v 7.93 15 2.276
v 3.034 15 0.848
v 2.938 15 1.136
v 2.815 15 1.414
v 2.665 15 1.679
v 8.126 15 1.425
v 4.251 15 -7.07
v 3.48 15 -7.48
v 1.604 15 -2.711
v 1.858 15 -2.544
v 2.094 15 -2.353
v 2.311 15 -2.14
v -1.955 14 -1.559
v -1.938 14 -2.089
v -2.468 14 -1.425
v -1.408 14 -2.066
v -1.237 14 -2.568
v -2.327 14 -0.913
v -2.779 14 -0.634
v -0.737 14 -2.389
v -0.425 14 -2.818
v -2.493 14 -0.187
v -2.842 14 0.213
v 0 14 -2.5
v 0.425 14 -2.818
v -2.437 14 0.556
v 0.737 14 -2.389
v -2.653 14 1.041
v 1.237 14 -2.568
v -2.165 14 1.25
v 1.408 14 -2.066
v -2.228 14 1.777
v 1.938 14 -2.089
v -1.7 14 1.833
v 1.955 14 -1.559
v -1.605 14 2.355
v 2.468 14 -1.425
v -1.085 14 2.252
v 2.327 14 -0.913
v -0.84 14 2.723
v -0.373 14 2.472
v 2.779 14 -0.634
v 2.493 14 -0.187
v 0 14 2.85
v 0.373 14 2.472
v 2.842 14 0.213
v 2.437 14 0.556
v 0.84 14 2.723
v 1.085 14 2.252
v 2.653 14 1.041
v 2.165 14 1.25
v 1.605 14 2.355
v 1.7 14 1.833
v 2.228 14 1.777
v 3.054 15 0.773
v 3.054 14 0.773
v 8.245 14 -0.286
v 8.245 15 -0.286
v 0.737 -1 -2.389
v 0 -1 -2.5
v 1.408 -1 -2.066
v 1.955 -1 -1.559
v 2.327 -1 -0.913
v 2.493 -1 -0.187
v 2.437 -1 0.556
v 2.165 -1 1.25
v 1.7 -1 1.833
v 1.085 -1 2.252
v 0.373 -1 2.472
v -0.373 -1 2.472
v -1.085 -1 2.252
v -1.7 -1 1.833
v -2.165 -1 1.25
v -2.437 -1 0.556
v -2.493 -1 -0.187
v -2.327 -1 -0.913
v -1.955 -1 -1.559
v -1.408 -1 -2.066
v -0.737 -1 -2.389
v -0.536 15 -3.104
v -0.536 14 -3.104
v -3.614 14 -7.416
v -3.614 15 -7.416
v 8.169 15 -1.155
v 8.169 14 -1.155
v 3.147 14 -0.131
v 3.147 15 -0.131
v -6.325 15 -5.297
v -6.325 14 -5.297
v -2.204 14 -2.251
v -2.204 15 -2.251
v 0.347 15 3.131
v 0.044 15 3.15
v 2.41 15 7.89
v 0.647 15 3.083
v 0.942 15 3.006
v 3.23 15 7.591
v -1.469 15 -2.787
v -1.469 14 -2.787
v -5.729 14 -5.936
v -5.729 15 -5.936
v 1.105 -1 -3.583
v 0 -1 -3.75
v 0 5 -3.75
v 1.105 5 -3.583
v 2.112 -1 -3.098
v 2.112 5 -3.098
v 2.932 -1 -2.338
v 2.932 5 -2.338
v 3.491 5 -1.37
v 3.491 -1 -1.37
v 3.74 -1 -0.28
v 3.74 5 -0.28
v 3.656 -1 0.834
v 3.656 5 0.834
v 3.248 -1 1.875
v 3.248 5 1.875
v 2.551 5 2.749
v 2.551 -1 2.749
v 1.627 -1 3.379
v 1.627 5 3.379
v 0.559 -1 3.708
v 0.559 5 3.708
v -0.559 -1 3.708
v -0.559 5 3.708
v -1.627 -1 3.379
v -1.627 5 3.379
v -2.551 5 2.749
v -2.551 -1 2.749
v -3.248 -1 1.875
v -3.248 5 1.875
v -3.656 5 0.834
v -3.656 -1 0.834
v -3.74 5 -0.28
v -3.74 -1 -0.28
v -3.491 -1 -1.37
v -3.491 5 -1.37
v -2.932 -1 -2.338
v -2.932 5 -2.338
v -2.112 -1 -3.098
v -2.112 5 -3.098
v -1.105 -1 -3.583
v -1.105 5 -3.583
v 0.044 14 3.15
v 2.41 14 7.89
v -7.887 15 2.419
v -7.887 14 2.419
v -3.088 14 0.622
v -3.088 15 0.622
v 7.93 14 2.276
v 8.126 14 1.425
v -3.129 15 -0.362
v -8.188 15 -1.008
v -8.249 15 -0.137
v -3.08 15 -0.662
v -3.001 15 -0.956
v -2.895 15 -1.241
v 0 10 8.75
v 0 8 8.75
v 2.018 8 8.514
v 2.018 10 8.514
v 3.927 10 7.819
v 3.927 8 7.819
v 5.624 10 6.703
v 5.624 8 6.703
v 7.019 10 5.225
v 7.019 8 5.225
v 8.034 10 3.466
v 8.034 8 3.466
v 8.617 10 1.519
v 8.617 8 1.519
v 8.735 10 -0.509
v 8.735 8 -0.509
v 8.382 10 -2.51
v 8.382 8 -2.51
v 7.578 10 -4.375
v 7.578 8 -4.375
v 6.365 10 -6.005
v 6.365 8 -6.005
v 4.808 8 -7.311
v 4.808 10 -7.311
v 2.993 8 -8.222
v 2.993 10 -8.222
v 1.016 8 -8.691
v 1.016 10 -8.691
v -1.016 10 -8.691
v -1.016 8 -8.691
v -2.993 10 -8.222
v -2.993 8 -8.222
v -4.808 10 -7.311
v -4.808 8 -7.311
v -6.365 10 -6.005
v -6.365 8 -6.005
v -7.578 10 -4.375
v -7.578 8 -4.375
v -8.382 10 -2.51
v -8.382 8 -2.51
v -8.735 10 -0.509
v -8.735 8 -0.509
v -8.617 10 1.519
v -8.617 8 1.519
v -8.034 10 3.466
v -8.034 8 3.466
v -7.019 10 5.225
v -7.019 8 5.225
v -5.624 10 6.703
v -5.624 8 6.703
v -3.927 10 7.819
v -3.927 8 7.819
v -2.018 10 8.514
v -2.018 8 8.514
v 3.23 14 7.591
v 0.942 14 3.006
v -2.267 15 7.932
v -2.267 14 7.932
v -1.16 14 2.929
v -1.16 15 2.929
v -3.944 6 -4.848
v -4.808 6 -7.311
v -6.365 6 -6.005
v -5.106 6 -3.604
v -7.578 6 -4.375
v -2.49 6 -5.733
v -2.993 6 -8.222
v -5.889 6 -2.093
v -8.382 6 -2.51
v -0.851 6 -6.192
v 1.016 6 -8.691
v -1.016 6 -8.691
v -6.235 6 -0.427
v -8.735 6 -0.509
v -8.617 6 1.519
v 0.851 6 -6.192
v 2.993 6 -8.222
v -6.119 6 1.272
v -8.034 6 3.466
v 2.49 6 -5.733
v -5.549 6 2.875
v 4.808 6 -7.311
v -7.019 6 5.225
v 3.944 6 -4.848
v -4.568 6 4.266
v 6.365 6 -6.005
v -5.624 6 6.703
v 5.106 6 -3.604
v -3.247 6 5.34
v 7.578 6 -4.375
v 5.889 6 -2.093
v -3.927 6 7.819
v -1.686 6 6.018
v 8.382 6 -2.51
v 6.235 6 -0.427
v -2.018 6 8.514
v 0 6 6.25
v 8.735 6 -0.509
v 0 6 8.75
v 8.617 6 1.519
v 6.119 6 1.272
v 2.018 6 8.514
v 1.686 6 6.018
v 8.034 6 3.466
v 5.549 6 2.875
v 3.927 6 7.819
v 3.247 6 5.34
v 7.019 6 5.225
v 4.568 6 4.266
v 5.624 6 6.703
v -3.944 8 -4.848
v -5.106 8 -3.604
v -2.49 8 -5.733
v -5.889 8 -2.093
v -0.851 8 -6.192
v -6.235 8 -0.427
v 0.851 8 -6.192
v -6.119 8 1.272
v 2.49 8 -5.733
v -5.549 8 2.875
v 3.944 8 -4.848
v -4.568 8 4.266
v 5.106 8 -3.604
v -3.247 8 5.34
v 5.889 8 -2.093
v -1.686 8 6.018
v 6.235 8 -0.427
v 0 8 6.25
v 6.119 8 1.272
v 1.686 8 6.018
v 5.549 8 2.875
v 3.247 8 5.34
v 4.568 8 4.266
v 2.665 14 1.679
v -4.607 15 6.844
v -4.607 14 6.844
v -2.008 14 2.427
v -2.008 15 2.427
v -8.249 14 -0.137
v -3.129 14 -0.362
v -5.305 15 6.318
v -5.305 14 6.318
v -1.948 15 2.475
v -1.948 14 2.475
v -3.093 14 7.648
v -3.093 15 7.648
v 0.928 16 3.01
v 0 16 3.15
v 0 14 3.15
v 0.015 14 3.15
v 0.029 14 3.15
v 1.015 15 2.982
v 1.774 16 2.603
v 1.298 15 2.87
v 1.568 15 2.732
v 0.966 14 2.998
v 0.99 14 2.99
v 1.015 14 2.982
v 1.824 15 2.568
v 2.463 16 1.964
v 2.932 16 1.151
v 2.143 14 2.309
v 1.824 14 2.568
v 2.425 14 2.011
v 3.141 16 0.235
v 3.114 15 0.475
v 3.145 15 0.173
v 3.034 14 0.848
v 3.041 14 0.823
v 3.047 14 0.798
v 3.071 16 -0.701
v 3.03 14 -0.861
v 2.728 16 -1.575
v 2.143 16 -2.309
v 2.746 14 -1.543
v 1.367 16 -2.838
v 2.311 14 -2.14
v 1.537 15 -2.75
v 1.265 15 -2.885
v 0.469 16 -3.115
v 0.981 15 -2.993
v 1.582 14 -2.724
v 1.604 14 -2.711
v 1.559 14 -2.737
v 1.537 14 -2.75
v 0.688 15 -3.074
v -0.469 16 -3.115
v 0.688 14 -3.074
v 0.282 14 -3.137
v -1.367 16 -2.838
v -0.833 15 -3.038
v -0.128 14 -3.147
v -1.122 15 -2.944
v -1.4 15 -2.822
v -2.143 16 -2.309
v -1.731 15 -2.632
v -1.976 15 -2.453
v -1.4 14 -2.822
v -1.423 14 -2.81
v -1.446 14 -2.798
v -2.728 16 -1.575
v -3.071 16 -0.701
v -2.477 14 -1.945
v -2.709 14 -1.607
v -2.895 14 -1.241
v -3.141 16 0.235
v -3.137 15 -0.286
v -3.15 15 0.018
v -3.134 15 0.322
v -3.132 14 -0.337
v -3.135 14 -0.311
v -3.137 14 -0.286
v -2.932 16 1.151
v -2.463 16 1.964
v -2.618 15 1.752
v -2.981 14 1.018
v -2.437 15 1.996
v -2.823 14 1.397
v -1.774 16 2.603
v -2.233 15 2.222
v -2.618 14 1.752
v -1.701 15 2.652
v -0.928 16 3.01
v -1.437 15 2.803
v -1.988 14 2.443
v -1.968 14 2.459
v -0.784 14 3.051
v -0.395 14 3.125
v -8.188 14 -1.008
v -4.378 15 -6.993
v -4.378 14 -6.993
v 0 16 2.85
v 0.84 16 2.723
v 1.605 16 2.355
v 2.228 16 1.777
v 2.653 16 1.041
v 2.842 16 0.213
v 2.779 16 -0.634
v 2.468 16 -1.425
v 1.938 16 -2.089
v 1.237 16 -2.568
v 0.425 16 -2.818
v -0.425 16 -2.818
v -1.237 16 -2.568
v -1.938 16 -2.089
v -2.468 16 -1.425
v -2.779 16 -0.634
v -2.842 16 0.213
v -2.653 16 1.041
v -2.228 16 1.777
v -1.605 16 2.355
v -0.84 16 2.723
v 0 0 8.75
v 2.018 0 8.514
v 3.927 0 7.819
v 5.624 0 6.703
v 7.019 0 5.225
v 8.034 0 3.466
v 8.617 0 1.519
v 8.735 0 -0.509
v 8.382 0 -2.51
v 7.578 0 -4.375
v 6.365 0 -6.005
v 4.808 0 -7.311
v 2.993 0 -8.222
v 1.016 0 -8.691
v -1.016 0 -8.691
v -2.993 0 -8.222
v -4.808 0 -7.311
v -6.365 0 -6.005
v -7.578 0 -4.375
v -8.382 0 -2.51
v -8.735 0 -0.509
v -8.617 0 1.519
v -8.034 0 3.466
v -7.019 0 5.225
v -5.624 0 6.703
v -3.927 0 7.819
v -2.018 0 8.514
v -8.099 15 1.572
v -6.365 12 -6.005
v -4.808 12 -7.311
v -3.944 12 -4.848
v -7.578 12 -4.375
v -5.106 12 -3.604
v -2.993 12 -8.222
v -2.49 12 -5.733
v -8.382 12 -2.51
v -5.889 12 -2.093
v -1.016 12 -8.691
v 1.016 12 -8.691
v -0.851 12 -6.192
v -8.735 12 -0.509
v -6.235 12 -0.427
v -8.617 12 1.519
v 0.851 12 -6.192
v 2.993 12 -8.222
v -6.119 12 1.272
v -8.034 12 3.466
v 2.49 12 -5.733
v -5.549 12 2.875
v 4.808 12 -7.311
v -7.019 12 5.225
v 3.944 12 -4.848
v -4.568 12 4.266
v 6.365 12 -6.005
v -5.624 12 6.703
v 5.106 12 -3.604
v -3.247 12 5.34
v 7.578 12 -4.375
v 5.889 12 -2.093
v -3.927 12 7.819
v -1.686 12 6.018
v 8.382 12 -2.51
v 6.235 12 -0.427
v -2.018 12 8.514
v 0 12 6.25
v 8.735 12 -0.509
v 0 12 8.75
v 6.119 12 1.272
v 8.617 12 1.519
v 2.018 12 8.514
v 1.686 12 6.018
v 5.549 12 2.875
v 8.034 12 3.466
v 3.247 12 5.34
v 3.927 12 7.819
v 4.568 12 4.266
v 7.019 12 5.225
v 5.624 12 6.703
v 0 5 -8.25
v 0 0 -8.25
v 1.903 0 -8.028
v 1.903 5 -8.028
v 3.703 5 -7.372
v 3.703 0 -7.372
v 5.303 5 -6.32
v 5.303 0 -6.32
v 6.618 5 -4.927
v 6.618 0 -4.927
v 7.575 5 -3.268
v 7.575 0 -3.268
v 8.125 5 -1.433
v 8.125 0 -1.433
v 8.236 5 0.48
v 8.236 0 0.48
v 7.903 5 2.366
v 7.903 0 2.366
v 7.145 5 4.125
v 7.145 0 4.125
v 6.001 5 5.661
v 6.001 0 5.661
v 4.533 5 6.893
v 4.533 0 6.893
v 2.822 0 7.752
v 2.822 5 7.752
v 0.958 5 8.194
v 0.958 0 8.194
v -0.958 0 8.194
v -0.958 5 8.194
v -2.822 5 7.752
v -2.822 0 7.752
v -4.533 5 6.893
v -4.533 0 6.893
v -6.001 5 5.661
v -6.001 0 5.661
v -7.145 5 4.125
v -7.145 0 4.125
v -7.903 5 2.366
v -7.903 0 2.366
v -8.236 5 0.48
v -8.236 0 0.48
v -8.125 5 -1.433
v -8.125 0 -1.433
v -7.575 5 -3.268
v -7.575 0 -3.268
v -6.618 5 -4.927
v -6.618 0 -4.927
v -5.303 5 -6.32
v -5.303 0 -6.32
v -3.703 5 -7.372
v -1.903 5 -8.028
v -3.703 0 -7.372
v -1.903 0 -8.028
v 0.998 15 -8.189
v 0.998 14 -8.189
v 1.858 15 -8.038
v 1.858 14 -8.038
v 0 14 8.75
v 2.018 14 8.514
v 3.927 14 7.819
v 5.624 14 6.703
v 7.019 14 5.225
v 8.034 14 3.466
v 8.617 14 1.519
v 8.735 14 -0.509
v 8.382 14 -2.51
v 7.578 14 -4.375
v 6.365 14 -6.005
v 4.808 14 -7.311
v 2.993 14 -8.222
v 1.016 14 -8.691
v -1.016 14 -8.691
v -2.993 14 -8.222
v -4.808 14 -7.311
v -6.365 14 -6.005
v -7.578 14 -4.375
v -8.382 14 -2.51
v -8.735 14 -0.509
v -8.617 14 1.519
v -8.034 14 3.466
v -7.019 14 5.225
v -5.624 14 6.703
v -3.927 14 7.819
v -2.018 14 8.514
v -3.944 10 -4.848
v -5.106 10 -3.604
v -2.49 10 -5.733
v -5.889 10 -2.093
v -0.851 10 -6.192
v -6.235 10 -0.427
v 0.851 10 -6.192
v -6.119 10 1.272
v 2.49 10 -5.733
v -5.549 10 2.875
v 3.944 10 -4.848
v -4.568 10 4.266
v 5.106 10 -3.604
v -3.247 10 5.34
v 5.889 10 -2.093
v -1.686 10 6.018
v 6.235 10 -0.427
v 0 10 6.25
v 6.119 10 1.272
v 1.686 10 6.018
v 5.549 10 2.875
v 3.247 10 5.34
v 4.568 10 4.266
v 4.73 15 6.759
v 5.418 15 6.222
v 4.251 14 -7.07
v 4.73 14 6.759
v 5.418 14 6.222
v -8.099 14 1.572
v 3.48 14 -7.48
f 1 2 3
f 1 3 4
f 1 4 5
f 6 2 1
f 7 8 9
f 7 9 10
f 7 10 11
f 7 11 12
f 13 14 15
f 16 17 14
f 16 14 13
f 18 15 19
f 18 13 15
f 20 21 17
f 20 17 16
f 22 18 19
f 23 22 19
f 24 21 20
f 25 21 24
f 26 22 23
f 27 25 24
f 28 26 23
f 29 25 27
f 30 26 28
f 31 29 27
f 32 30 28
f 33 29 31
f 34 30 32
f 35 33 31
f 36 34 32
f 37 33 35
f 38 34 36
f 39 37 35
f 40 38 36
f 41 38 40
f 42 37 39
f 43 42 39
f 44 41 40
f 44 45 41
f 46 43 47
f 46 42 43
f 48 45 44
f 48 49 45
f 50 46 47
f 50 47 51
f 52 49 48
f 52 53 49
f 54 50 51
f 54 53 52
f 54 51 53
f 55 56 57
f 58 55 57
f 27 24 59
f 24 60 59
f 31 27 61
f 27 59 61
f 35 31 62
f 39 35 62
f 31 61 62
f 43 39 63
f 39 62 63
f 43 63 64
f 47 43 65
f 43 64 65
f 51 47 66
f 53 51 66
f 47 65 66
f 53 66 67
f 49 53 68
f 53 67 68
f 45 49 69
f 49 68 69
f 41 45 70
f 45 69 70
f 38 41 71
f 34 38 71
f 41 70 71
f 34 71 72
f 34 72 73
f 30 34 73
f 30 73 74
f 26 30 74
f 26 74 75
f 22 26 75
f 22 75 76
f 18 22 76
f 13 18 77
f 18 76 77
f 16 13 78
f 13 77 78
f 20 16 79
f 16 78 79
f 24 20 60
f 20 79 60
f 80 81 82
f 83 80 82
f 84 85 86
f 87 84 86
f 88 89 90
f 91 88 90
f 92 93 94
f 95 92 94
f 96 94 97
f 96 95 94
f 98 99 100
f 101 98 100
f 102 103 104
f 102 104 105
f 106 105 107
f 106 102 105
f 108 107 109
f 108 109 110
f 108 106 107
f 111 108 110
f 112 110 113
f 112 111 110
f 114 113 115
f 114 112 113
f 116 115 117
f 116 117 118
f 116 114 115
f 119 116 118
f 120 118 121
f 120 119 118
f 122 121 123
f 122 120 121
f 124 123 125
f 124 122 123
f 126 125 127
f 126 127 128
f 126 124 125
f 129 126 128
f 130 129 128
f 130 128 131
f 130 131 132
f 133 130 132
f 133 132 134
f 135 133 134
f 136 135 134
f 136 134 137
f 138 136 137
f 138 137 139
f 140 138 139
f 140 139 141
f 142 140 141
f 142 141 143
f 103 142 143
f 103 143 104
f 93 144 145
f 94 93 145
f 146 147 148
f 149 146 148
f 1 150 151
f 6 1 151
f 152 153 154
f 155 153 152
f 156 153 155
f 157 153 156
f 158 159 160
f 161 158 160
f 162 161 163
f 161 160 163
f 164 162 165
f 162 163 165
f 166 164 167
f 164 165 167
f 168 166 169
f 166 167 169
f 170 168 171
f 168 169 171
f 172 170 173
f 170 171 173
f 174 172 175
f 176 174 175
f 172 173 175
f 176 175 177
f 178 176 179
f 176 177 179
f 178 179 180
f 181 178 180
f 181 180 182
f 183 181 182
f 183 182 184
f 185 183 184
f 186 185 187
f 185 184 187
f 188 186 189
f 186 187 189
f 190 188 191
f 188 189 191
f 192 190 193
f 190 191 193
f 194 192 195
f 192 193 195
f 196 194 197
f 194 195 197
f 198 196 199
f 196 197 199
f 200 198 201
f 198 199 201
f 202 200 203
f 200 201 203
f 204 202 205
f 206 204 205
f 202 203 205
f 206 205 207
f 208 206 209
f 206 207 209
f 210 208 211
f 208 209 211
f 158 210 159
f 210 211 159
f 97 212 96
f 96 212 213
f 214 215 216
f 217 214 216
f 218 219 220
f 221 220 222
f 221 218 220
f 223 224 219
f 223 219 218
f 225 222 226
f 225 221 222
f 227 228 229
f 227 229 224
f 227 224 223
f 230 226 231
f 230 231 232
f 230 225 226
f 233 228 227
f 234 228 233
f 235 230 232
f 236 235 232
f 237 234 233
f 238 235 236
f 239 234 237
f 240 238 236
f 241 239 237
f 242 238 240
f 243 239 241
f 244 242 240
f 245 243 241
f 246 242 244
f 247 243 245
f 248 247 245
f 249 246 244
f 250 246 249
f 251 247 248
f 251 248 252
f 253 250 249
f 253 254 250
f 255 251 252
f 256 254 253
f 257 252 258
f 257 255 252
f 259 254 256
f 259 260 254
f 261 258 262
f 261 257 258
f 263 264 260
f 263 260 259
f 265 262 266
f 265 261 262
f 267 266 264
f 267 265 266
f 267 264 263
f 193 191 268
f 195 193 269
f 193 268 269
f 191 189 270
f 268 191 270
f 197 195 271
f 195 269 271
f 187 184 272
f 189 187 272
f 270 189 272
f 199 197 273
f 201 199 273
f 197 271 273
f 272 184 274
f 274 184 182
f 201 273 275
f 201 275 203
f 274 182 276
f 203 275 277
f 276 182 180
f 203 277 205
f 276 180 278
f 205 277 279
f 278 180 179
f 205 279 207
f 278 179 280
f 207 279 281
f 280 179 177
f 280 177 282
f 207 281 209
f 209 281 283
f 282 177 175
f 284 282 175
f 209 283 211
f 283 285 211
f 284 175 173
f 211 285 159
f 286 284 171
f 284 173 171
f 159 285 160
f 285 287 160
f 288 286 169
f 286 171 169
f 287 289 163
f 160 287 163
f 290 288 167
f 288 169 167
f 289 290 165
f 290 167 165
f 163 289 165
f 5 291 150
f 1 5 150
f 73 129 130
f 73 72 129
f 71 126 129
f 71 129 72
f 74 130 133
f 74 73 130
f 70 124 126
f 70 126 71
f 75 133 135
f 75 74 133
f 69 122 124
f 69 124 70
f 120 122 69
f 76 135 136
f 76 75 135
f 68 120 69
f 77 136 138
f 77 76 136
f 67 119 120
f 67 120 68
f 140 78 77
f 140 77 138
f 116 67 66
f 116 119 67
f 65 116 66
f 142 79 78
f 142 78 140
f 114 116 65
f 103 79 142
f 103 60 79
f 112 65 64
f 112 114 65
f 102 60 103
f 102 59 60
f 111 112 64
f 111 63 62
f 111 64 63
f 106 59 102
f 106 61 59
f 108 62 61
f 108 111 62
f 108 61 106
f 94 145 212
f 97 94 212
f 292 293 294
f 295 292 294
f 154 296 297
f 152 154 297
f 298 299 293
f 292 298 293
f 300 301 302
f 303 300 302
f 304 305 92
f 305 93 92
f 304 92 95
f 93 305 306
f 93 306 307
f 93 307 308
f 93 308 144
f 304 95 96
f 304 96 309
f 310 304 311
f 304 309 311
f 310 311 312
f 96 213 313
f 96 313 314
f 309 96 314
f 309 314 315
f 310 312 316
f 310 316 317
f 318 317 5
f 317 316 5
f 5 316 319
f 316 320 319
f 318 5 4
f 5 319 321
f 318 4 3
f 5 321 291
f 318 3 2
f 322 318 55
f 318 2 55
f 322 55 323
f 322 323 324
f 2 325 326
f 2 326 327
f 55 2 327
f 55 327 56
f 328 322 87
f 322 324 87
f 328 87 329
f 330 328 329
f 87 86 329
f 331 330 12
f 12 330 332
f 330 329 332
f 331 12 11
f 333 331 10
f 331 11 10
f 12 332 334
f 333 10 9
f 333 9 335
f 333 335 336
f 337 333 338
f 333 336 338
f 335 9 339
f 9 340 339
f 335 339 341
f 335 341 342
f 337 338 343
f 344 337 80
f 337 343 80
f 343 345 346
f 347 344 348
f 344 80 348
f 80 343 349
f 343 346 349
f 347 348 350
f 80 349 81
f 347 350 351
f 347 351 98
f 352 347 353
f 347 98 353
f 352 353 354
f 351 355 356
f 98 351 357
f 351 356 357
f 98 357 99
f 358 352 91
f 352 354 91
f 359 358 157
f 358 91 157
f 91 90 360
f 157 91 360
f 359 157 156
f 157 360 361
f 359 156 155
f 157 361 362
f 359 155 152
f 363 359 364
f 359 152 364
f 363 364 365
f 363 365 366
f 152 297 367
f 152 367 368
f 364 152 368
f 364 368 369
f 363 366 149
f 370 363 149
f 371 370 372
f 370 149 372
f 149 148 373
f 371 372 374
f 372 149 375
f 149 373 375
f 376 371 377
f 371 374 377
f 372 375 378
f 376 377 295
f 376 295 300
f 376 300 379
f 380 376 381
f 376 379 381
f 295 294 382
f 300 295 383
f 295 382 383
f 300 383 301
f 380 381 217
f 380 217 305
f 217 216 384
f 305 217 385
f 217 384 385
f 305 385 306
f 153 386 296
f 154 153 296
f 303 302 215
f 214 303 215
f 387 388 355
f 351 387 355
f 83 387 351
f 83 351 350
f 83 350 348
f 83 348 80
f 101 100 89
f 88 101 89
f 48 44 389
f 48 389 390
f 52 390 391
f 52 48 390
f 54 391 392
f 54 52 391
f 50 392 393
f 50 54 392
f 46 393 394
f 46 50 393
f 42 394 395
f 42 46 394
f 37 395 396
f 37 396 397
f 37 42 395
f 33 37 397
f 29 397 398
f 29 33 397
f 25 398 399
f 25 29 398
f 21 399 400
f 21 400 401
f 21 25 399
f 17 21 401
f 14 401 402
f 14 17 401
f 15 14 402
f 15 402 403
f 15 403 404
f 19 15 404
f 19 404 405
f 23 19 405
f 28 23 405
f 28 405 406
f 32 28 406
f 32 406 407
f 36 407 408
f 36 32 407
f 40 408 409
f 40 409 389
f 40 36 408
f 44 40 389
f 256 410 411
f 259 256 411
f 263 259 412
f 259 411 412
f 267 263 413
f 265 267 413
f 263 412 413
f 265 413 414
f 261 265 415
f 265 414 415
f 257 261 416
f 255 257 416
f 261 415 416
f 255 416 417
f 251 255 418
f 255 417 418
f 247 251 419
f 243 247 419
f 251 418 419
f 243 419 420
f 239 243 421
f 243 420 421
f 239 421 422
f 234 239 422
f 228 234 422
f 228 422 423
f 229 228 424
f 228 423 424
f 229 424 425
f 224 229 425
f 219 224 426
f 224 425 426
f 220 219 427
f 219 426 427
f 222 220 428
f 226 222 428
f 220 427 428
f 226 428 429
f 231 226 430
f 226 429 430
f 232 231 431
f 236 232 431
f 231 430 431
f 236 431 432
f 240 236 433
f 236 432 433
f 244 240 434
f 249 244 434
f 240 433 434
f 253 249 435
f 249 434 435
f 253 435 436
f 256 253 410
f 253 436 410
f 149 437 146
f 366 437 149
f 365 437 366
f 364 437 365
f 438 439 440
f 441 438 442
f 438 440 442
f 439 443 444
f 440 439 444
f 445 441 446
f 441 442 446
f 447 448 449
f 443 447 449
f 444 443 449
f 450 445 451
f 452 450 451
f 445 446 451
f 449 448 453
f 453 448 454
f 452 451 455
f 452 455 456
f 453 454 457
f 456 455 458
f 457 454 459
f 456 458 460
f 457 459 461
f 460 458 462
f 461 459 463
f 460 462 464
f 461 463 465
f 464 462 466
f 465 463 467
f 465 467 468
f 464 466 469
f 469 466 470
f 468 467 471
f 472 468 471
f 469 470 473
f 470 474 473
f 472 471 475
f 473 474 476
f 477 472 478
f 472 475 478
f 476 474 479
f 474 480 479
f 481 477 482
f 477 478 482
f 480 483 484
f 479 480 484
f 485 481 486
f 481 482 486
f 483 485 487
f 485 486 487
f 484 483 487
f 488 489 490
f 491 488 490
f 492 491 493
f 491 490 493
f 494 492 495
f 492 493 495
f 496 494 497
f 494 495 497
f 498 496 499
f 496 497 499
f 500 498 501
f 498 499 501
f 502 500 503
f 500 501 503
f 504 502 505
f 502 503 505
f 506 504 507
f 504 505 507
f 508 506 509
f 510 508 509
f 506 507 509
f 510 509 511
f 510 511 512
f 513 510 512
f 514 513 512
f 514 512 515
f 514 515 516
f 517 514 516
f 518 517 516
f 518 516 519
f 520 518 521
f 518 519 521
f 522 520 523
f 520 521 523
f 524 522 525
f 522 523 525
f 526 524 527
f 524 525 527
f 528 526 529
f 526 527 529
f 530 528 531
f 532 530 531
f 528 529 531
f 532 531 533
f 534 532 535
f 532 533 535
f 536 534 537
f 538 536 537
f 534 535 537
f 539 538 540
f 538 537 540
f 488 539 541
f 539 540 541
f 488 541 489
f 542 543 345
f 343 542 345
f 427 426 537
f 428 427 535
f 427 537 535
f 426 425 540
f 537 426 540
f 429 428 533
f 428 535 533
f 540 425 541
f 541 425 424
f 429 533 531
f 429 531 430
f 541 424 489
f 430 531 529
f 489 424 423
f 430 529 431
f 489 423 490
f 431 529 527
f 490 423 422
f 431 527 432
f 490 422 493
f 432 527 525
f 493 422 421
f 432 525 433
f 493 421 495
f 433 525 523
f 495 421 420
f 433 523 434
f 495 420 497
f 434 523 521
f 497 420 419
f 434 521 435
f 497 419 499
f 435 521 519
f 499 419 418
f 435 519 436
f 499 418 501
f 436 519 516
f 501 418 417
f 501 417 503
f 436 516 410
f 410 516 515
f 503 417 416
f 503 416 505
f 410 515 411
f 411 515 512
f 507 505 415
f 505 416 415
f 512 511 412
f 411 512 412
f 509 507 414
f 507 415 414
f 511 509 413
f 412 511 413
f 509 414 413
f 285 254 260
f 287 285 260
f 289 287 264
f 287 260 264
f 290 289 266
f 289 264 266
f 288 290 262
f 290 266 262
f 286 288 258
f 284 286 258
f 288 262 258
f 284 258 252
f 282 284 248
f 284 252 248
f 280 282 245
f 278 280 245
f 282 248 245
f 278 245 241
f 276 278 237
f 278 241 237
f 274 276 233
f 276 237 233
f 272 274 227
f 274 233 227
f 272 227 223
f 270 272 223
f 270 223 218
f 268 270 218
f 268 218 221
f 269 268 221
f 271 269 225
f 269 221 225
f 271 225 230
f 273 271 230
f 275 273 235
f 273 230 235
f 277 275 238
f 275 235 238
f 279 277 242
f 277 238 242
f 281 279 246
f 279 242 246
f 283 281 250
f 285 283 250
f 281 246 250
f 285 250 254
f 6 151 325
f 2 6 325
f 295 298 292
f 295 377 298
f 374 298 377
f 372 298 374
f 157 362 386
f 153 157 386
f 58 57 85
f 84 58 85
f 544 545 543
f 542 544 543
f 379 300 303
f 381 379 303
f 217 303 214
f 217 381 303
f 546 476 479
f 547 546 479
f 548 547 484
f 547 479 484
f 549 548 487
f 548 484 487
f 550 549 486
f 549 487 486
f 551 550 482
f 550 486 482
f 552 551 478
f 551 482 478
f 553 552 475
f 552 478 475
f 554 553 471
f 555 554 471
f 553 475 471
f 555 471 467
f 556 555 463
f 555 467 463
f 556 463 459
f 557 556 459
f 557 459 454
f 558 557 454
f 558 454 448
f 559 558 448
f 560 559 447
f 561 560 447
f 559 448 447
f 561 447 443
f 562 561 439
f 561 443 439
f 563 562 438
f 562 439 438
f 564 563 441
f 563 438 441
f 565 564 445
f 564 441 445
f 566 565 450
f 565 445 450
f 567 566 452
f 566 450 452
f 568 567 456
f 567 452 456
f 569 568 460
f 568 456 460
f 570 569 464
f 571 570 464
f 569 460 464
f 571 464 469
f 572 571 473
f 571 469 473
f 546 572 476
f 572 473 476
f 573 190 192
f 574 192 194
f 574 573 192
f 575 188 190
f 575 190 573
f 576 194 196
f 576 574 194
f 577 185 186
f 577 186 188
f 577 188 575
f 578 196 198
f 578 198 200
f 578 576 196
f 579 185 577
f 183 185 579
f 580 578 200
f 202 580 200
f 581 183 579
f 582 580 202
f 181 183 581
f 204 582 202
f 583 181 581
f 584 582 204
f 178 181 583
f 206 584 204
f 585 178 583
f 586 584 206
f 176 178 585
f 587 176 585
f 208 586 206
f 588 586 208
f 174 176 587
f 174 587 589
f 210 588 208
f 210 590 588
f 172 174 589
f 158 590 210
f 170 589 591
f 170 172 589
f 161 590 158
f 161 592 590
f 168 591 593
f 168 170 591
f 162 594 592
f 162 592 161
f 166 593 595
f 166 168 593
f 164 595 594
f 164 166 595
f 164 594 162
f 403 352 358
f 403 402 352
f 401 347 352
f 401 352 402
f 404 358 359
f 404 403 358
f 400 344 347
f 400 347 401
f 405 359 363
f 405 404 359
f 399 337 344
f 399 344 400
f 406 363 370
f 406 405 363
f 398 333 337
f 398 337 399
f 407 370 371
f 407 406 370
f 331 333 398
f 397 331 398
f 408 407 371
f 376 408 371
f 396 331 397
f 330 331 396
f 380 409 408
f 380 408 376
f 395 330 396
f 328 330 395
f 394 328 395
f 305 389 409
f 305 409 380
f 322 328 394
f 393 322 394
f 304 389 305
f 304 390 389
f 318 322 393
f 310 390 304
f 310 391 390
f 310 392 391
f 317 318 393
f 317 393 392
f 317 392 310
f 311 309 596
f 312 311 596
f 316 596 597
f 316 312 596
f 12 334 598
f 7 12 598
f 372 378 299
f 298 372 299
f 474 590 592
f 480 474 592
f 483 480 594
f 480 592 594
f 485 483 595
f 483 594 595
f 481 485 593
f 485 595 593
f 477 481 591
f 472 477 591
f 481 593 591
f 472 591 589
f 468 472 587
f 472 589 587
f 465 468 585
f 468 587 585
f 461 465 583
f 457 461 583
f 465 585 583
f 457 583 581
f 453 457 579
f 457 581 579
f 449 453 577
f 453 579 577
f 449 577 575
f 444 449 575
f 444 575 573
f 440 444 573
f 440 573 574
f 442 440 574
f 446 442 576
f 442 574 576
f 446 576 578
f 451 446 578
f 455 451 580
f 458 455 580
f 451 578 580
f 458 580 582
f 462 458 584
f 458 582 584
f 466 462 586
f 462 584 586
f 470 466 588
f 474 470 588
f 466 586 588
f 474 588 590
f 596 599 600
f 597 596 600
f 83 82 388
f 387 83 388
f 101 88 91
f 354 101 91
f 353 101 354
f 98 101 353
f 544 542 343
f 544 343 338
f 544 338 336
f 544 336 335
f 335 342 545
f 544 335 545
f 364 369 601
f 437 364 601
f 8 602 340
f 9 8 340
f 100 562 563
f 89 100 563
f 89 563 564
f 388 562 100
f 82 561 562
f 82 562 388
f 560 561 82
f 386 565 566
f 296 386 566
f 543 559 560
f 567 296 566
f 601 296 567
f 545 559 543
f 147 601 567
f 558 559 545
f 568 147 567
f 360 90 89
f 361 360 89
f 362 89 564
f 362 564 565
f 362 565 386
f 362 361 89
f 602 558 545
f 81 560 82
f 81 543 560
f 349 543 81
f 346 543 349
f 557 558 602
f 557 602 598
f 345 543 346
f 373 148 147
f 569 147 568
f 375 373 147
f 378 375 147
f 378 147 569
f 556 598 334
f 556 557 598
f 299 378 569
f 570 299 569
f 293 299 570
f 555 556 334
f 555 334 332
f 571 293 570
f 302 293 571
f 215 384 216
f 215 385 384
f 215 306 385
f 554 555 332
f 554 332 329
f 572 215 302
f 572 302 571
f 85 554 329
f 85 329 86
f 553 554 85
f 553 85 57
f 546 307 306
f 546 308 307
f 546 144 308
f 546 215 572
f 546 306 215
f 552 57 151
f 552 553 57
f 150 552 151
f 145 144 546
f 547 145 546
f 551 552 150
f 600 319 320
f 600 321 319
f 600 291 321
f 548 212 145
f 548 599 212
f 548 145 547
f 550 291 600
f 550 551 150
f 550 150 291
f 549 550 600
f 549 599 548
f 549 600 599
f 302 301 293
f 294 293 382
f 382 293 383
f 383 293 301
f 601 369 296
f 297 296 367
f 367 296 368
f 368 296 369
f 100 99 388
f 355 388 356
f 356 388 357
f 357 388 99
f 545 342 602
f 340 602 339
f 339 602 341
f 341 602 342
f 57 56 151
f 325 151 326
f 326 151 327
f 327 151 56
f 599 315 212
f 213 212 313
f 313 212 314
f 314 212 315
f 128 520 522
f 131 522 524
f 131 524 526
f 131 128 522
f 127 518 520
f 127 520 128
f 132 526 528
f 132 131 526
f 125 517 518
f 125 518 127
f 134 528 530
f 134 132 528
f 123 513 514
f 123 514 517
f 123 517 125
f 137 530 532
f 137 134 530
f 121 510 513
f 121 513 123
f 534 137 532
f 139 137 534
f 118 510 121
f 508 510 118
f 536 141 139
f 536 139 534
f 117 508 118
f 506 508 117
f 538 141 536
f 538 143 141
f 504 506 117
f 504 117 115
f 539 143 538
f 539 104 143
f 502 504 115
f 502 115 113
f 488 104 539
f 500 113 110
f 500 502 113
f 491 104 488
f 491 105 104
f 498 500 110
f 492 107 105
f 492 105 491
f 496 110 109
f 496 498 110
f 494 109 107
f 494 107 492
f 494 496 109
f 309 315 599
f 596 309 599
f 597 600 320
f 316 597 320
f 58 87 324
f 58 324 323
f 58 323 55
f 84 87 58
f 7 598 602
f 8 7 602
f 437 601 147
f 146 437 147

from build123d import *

# Parameters (mm, degrees)
SKETCH1_R            = 8.75
BOSS_EXTRUDE1_DEPTH  = 6
SKETCH2_R            = 8.25
SKETCH2_R_2          = 3.75
CUT_EXTRUDE1_DEPTH   = 5
SKETCH3_R            = 2.5
CUT_EXTRUDE2_DEPTH   = 20
BOSS_EXTRUDE3_START  = 1
SKETCH5_R            = 3.75
SKETCH5_R_2          = 2.5
BOSS_EXTRUDE3_DEPTH  = 1
SKETCH4_R            = 6.25
BOSS_EXTRUDE4_DEPTH  = 2
SKETCH7_R            = 8.75
BOSS_EXTRUDE5_DEPTH  = 2
SKETCH9_R            = 6.25
BOSS_EXTRUDE6_DEPTH  = 2
SKETCH10_R           = 8.75
BOSS_EXTRUDE7_DEPTH  = 2
SKETCH11_R           = 2.5
CUT_EXTRUDE4_DEPTH   = 15.735162028
SKETCH12_R           = 3.1
BOSS_EXTRUDE8_DEPTH  = 1
SKETCH13_R           = 3.065
CUT_EXTRUDE5_DEPTH   = 1
CUT_EXTRUDE6_START   = -1
SKETCH15_R           = 8.25
CUT_EXTRUDE6_DEPTH   = 1
SKETCH16_R           = 3.15
SKETCH16_R_2         = 2.85
BOSS_EXTRUDE10_DEPTH = 2
BOSS_EXTRUDE11_DEPTH = 1
CIRPATTERN1_START    = 14
CIRPATTERN1_DEPTH    = 1


# Read off the part's stored shape, not the designer's step: CirPattern1
with BuildPart() as part:
    # Sketch1 → Boss-Extrude1 (new body)
    with BuildSketch(Plane(origin=(0, 0, 0), x_dir=(1, 0, 0), z_dir=(0, 1, 0))):
        with Locations(Location((0, 0, 0), (0, 0, 270))):
            Circle(SKETCH1_R)
    extrude(amount=BOSS_EXTRUDE1_DEPTH)

    # Sketch2 → Cut-Extrude1 (cut)
    with BuildSketch(Plane.XZ):
        with Locations(Location((0, 0, 0), (0, 0, 270))):
            Circle(SKETCH2_R)
        with Locations(Location((0, 0, 0), (0, 0, 270))):
            Circle(SKETCH2_R_2, mode=Mode.SUBTRACT)
    extrude(amount=-CUT_EXTRUDE1_DEPTH, mode=Mode.SUBTRACT)

    # Sketch3 → Cut-Extrude2 (cut)
    with BuildSketch(Plane.XZ):
        with Locations(Location((0, 0, 0), (0, 0, 270))):
            Circle(SKETCH3_R)
    extrude(amount=-CUT_EXTRUDE2_DEPTH, mode=Mode.SUBTRACT)

    # Sketch5 → Boss-Extrude3 (add)
    with BuildSketch(Plane.XZ.offset(BOSS_EXTRUDE3_START)):
        with Locations(Location((0, 0, 0), (0, 0, 270))):
            Circle(SKETCH5_R)
        with Locations(Location((0, 0, 0), (0, 0, 270))):
            Circle(SKETCH5_R_2, mode=Mode.SUBTRACT)
    extrude(amount=-BOSS_EXTRUDE3_DEPTH)

    # Sketch4 → Boss-Extrude4 (add)
    with BuildSketch(Plane(origin=(0, 6, 0), x_dir=(1, 0, 0), z_dir=(0, 1, 0))):
        with Locations(Location((0, 0, 0), (0, 0, 270))):
            Circle(SKETCH4_R)
    extrude(amount=BOSS_EXTRUDE4_DEPTH)

    # Sketch7 → Boss-Extrude5 (add)
    with BuildSketch(Plane(origin=(0, 8, 0), x_dir=(1, 0, 0), z_dir=(0, 1, 0))):
        with Locations(Location((0, 0, 0), (0, 0, 270))):
            Circle(SKETCH7_R)
    extrude(amount=BOSS_EXTRUDE5_DEPTH)

    # Sketch9 → Boss-Extrude6 (add)
    with BuildSketch(Plane(origin=(0, 10, 0), x_dir=(1, 0, 0), z_dir=(0, 1, 0))):
        with Locations(Location((0, 0, 0), (0, 0, 270))):
            Circle(SKETCH9_R)
    extrude(amount=BOSS_EXTRUDE6_DEPTH)

    # Sketch10 → Boss-Extrude7 (add)
    with BuildSketch(Plane(origin=(0, 12, 0), x_dir=(1, 0, 0), z_dir=(0, 1, 0))):
        with Locations(Location((0, 0, 0), (0, 0, 270))):
            Circle(SKETCH10_R)
    extrude(amount=BOSS_EXTRUDE7_DEPTH)

    # Sketch11 → Cut-Extrude4 (cut, through all)
    with BuildSketch(Plane.XZ.offset(-6)):
        with Locations(Location((0, 0, 0), (0, 0, 270))):
            Circle(SKETCH11_R)
    extrude(amount=-CUT_EXTRUDE4_DEPTH, mode=Mode.SUBTRACT)

    # Sketch12 → Boss-Extrude8 (add)
    with BuildSketch(Plane(origin=(0, 14, 0), x_dir=(1, 0, 0), z_dir=(0, 1, 0))):
        with Locations(Location((0, 0, 0), (0, 0, 270))):
            Circle(SKETCH12_R)
    extrude(amount=BOSS_EXTRUDE8_DEPTH)

    # Sketch13 → Cut-Extrude5 (cut)
    with BuildSketch(Plane(origin=(0, 15, 0), x_dir=(1, 0, 0), z_dir=(0, 1, 0))):
        with Locations(Location((0, 0, 0), (0, 0, 270))):
            Circle(SKETCH13_R)
    extrude(amount=-CUT_EXTRUDE5_DEPTH, mode=Mode.SUBTRACT)

    # Sketch15 → Cut-Extrude6 (cut)
    with BuildSketch(Plane(origin=(0, 15, 0), x_dir=(1, 0, 0), z_dir=(0, 1, 0)).offset(CUT_EXTRUDE6_START)):
        with Locations(Location((0, 0, 0), (0, 0, 90))):
            Circle(SKETCH15_R)
    extrude(amount=CUT_EXTRUDE6_DEPTH, mode=Mode.SUBTRACT)

    # Sketch16 → Boss-Extrude10 (add)
    with BuildSketch(Plane(origin=(0, 14, 0), x_dir=(1, 0, 0), z_dir=(0, 1, 0))):
        with Locations(Location((0, 0, 0), (0, 0, 270))):
            Circle(SKETCH16_R)
        with Locations(Location((0, 0, 0), (0, 0, 270))):
            Circle(SKETCH16_R_2, mode=Mode.SUBTRACT)
    extrude(amount=BOSS_EXTRUDE10_DEPTH)

    # Sketch14 → Boss-Extrude11 (add)
    with BuildSketch(Plane(origin=(0, 14, 0), x_dir=(1, 0, 0), z_dir=(0, 1, 0))):
        Polygon((0.998161763, 8.189393939), (0.684499773, 3.023484755), (1.533676009, 2.694037472), (1.858150244, 8.038020756), align=None)
    extrude(amount=BOSS_EXTRUDE11_DEPTH)

    # CirPattern1 outline → CirPattern1 (add)
    with BuildSketch(Plane(origin=(0, 0, 0), x_dir=(1, 0, 0), z_dir=(0, 1, 0)).offset(CIRPATTERN1_START)):
        with BuildLine():
            Line((-6.324565807, 5.297392505), (-2.203633173, 2.2508889))
            ThreePointArc((-2.203633173, 2.2508889), (-1.85566188, 2.545391716), (-1.468825776, 2.786584081))
            Line((-1.468825776, 2.786584081), (-5.729230277, 5.936195788))
            Line((-5.729230277, 5.936195788), (-6.324565807, 5.297392505))
        make_face()
        with BuildLine():
            ThreePointArc((-3.129074903, 0.362477928), (-3.043987046, 0.810335032), (-2.895146203, 1.241220553))
            Line((-2.895146203, 1.241220553), (-8.188217227, 1.007769145))
            Line((-8.188217227, 1.007769145), (-8.248867898, 0.136668965))
            Line((-8.248867898, 0.136668965), (-3.129074903, 0.362477928))
        make_face()
        with BuildLine():
            Line((-4.378035213, 6.992517978), (-1.400216766, 2.821682656))
            ThreePointArc((-1.400216766, 2.821682656), (-0.978270026, 2.994242435), (-0.535834488, 3.104091075))
            Line((-0.535834488, 3.104091075), (-3.614436407, 7.416087207))
            Line((-3.614436407, 7.416087207), (-4.378035213, 6.992517978))
        make_face()
        with BuildLine():
            ThreePointArc((-3.087938917, -0.622200326), (-3.145411012, -0.169969315), (-3.137005907, 0.285821517))
            Line((-3.137005907, 0.285821517), (-8.098875142, -1.571852864))
            Line((-8.098875142, -1.571852864), (-7.887372599, -2.419060455))
            Line((-7.887372599, -2.419060455), (-3.087938917, -0.622200326))
        make_face()
        with BuildLine():
            Line((3.47997015, 7.480127523), (1.603849487, 2.711119109))
            ThreePointArc((1.603849487, 2.711119109), (1.97837896, 2.451227588), (2.311473446, 2.139997782))
            Line((2.311473446, 2.139997782), (4.251090913, 7.070412014))
            Line((4.251090913, 7.070412014), (3.47997015, 7.480127523))
        make_face()
        with BuildLine():
            ThreePointArc((-2.008215906, -2.426843397), (-2.337478309, -2.111562255), (-2.61778478, -1.752056747))
            Line((-2.61778478, -1.752056747), (-5.30480905, -6.318346377))
            Line((-5.30480905, -6.318346377), (-4.60727569, -6.843647471))
            Line((-4.60727569, -6.843647471), (-2.008215906, -2.426843397))
        make_face()
        with BuildLine():
            Line((8.168690382, 1.155420894), (3.14725484, 0.131479935))
            ThreePointArc((3.14725484, 0.131479935), (3.133274841, -0.324173978), (3.053671823, -0.773038421))
            Line((3.053671823, -0.773038421), (8.245056512, 0.285557547))
            Line((8.245056512, 0.285557547), (8.168690382, 1.155420894))
        make_face()
        with BuildLine():
            ThreePointArc((-1.159990971, -2.92863807), (-1.570565356, -2.730535563), (-1.948245964, -2.47524497))
            Line((-1.948245964, -2.47524497), (-3.092696808, -7.648380643))
            Line((-3.092696808, -7.648380643), (-2.266976195, -7.932422009))
            Line((-2.266976195, -7.932422009), (-1.159990971, -2.92863807))
        make_face()
        with BuildLine():
            Line((8.125930909, -1.42539358), (3.033846758, -0.847510382))
            ThreePointArc((3.033846758, -0.847510382), (2.879746187, -1.276542948), (2.665332476, -1.678839716))
            Line((2.665332476, -1.678839716), (7.929756858, -2.276281216))
            Line((7.929756858, -2.276281216), (8.125930909, -1.42539358))
        make_face()
        with BuildLine():
            ThreePointArc((0.941569357, -3.00598522), (0.497823185, -3.11041349), (0.04365065, -3.149697544))
            Line((0.04365065, -3.149697544), (2.409805062, -7.890205293))
            Line((2.409805062, -7.890205293), (3.230263526, -7.591304075))
            Line((3.230263526, -7.591304075), (0.941569357, -3.00598522))
        make_face()
        with BuildLine():
            Line((5.418005144, -6.221552882), (1.824386191, -2.567900899))
            ThreePointArc((1.824386191, -2.567900899), (1.434628612, -2.804343193), (1.014824303, -2.982051581))
            Line((1.014824303, -2.982051581), (4.730068332, -6.759360441))
            Line((4.730068332, -6.759360441), (5.418005144, -6.221552882))
        make_face()
    extrude(amount=CIRPATTERN1_DEPTH)


solid = part.part
